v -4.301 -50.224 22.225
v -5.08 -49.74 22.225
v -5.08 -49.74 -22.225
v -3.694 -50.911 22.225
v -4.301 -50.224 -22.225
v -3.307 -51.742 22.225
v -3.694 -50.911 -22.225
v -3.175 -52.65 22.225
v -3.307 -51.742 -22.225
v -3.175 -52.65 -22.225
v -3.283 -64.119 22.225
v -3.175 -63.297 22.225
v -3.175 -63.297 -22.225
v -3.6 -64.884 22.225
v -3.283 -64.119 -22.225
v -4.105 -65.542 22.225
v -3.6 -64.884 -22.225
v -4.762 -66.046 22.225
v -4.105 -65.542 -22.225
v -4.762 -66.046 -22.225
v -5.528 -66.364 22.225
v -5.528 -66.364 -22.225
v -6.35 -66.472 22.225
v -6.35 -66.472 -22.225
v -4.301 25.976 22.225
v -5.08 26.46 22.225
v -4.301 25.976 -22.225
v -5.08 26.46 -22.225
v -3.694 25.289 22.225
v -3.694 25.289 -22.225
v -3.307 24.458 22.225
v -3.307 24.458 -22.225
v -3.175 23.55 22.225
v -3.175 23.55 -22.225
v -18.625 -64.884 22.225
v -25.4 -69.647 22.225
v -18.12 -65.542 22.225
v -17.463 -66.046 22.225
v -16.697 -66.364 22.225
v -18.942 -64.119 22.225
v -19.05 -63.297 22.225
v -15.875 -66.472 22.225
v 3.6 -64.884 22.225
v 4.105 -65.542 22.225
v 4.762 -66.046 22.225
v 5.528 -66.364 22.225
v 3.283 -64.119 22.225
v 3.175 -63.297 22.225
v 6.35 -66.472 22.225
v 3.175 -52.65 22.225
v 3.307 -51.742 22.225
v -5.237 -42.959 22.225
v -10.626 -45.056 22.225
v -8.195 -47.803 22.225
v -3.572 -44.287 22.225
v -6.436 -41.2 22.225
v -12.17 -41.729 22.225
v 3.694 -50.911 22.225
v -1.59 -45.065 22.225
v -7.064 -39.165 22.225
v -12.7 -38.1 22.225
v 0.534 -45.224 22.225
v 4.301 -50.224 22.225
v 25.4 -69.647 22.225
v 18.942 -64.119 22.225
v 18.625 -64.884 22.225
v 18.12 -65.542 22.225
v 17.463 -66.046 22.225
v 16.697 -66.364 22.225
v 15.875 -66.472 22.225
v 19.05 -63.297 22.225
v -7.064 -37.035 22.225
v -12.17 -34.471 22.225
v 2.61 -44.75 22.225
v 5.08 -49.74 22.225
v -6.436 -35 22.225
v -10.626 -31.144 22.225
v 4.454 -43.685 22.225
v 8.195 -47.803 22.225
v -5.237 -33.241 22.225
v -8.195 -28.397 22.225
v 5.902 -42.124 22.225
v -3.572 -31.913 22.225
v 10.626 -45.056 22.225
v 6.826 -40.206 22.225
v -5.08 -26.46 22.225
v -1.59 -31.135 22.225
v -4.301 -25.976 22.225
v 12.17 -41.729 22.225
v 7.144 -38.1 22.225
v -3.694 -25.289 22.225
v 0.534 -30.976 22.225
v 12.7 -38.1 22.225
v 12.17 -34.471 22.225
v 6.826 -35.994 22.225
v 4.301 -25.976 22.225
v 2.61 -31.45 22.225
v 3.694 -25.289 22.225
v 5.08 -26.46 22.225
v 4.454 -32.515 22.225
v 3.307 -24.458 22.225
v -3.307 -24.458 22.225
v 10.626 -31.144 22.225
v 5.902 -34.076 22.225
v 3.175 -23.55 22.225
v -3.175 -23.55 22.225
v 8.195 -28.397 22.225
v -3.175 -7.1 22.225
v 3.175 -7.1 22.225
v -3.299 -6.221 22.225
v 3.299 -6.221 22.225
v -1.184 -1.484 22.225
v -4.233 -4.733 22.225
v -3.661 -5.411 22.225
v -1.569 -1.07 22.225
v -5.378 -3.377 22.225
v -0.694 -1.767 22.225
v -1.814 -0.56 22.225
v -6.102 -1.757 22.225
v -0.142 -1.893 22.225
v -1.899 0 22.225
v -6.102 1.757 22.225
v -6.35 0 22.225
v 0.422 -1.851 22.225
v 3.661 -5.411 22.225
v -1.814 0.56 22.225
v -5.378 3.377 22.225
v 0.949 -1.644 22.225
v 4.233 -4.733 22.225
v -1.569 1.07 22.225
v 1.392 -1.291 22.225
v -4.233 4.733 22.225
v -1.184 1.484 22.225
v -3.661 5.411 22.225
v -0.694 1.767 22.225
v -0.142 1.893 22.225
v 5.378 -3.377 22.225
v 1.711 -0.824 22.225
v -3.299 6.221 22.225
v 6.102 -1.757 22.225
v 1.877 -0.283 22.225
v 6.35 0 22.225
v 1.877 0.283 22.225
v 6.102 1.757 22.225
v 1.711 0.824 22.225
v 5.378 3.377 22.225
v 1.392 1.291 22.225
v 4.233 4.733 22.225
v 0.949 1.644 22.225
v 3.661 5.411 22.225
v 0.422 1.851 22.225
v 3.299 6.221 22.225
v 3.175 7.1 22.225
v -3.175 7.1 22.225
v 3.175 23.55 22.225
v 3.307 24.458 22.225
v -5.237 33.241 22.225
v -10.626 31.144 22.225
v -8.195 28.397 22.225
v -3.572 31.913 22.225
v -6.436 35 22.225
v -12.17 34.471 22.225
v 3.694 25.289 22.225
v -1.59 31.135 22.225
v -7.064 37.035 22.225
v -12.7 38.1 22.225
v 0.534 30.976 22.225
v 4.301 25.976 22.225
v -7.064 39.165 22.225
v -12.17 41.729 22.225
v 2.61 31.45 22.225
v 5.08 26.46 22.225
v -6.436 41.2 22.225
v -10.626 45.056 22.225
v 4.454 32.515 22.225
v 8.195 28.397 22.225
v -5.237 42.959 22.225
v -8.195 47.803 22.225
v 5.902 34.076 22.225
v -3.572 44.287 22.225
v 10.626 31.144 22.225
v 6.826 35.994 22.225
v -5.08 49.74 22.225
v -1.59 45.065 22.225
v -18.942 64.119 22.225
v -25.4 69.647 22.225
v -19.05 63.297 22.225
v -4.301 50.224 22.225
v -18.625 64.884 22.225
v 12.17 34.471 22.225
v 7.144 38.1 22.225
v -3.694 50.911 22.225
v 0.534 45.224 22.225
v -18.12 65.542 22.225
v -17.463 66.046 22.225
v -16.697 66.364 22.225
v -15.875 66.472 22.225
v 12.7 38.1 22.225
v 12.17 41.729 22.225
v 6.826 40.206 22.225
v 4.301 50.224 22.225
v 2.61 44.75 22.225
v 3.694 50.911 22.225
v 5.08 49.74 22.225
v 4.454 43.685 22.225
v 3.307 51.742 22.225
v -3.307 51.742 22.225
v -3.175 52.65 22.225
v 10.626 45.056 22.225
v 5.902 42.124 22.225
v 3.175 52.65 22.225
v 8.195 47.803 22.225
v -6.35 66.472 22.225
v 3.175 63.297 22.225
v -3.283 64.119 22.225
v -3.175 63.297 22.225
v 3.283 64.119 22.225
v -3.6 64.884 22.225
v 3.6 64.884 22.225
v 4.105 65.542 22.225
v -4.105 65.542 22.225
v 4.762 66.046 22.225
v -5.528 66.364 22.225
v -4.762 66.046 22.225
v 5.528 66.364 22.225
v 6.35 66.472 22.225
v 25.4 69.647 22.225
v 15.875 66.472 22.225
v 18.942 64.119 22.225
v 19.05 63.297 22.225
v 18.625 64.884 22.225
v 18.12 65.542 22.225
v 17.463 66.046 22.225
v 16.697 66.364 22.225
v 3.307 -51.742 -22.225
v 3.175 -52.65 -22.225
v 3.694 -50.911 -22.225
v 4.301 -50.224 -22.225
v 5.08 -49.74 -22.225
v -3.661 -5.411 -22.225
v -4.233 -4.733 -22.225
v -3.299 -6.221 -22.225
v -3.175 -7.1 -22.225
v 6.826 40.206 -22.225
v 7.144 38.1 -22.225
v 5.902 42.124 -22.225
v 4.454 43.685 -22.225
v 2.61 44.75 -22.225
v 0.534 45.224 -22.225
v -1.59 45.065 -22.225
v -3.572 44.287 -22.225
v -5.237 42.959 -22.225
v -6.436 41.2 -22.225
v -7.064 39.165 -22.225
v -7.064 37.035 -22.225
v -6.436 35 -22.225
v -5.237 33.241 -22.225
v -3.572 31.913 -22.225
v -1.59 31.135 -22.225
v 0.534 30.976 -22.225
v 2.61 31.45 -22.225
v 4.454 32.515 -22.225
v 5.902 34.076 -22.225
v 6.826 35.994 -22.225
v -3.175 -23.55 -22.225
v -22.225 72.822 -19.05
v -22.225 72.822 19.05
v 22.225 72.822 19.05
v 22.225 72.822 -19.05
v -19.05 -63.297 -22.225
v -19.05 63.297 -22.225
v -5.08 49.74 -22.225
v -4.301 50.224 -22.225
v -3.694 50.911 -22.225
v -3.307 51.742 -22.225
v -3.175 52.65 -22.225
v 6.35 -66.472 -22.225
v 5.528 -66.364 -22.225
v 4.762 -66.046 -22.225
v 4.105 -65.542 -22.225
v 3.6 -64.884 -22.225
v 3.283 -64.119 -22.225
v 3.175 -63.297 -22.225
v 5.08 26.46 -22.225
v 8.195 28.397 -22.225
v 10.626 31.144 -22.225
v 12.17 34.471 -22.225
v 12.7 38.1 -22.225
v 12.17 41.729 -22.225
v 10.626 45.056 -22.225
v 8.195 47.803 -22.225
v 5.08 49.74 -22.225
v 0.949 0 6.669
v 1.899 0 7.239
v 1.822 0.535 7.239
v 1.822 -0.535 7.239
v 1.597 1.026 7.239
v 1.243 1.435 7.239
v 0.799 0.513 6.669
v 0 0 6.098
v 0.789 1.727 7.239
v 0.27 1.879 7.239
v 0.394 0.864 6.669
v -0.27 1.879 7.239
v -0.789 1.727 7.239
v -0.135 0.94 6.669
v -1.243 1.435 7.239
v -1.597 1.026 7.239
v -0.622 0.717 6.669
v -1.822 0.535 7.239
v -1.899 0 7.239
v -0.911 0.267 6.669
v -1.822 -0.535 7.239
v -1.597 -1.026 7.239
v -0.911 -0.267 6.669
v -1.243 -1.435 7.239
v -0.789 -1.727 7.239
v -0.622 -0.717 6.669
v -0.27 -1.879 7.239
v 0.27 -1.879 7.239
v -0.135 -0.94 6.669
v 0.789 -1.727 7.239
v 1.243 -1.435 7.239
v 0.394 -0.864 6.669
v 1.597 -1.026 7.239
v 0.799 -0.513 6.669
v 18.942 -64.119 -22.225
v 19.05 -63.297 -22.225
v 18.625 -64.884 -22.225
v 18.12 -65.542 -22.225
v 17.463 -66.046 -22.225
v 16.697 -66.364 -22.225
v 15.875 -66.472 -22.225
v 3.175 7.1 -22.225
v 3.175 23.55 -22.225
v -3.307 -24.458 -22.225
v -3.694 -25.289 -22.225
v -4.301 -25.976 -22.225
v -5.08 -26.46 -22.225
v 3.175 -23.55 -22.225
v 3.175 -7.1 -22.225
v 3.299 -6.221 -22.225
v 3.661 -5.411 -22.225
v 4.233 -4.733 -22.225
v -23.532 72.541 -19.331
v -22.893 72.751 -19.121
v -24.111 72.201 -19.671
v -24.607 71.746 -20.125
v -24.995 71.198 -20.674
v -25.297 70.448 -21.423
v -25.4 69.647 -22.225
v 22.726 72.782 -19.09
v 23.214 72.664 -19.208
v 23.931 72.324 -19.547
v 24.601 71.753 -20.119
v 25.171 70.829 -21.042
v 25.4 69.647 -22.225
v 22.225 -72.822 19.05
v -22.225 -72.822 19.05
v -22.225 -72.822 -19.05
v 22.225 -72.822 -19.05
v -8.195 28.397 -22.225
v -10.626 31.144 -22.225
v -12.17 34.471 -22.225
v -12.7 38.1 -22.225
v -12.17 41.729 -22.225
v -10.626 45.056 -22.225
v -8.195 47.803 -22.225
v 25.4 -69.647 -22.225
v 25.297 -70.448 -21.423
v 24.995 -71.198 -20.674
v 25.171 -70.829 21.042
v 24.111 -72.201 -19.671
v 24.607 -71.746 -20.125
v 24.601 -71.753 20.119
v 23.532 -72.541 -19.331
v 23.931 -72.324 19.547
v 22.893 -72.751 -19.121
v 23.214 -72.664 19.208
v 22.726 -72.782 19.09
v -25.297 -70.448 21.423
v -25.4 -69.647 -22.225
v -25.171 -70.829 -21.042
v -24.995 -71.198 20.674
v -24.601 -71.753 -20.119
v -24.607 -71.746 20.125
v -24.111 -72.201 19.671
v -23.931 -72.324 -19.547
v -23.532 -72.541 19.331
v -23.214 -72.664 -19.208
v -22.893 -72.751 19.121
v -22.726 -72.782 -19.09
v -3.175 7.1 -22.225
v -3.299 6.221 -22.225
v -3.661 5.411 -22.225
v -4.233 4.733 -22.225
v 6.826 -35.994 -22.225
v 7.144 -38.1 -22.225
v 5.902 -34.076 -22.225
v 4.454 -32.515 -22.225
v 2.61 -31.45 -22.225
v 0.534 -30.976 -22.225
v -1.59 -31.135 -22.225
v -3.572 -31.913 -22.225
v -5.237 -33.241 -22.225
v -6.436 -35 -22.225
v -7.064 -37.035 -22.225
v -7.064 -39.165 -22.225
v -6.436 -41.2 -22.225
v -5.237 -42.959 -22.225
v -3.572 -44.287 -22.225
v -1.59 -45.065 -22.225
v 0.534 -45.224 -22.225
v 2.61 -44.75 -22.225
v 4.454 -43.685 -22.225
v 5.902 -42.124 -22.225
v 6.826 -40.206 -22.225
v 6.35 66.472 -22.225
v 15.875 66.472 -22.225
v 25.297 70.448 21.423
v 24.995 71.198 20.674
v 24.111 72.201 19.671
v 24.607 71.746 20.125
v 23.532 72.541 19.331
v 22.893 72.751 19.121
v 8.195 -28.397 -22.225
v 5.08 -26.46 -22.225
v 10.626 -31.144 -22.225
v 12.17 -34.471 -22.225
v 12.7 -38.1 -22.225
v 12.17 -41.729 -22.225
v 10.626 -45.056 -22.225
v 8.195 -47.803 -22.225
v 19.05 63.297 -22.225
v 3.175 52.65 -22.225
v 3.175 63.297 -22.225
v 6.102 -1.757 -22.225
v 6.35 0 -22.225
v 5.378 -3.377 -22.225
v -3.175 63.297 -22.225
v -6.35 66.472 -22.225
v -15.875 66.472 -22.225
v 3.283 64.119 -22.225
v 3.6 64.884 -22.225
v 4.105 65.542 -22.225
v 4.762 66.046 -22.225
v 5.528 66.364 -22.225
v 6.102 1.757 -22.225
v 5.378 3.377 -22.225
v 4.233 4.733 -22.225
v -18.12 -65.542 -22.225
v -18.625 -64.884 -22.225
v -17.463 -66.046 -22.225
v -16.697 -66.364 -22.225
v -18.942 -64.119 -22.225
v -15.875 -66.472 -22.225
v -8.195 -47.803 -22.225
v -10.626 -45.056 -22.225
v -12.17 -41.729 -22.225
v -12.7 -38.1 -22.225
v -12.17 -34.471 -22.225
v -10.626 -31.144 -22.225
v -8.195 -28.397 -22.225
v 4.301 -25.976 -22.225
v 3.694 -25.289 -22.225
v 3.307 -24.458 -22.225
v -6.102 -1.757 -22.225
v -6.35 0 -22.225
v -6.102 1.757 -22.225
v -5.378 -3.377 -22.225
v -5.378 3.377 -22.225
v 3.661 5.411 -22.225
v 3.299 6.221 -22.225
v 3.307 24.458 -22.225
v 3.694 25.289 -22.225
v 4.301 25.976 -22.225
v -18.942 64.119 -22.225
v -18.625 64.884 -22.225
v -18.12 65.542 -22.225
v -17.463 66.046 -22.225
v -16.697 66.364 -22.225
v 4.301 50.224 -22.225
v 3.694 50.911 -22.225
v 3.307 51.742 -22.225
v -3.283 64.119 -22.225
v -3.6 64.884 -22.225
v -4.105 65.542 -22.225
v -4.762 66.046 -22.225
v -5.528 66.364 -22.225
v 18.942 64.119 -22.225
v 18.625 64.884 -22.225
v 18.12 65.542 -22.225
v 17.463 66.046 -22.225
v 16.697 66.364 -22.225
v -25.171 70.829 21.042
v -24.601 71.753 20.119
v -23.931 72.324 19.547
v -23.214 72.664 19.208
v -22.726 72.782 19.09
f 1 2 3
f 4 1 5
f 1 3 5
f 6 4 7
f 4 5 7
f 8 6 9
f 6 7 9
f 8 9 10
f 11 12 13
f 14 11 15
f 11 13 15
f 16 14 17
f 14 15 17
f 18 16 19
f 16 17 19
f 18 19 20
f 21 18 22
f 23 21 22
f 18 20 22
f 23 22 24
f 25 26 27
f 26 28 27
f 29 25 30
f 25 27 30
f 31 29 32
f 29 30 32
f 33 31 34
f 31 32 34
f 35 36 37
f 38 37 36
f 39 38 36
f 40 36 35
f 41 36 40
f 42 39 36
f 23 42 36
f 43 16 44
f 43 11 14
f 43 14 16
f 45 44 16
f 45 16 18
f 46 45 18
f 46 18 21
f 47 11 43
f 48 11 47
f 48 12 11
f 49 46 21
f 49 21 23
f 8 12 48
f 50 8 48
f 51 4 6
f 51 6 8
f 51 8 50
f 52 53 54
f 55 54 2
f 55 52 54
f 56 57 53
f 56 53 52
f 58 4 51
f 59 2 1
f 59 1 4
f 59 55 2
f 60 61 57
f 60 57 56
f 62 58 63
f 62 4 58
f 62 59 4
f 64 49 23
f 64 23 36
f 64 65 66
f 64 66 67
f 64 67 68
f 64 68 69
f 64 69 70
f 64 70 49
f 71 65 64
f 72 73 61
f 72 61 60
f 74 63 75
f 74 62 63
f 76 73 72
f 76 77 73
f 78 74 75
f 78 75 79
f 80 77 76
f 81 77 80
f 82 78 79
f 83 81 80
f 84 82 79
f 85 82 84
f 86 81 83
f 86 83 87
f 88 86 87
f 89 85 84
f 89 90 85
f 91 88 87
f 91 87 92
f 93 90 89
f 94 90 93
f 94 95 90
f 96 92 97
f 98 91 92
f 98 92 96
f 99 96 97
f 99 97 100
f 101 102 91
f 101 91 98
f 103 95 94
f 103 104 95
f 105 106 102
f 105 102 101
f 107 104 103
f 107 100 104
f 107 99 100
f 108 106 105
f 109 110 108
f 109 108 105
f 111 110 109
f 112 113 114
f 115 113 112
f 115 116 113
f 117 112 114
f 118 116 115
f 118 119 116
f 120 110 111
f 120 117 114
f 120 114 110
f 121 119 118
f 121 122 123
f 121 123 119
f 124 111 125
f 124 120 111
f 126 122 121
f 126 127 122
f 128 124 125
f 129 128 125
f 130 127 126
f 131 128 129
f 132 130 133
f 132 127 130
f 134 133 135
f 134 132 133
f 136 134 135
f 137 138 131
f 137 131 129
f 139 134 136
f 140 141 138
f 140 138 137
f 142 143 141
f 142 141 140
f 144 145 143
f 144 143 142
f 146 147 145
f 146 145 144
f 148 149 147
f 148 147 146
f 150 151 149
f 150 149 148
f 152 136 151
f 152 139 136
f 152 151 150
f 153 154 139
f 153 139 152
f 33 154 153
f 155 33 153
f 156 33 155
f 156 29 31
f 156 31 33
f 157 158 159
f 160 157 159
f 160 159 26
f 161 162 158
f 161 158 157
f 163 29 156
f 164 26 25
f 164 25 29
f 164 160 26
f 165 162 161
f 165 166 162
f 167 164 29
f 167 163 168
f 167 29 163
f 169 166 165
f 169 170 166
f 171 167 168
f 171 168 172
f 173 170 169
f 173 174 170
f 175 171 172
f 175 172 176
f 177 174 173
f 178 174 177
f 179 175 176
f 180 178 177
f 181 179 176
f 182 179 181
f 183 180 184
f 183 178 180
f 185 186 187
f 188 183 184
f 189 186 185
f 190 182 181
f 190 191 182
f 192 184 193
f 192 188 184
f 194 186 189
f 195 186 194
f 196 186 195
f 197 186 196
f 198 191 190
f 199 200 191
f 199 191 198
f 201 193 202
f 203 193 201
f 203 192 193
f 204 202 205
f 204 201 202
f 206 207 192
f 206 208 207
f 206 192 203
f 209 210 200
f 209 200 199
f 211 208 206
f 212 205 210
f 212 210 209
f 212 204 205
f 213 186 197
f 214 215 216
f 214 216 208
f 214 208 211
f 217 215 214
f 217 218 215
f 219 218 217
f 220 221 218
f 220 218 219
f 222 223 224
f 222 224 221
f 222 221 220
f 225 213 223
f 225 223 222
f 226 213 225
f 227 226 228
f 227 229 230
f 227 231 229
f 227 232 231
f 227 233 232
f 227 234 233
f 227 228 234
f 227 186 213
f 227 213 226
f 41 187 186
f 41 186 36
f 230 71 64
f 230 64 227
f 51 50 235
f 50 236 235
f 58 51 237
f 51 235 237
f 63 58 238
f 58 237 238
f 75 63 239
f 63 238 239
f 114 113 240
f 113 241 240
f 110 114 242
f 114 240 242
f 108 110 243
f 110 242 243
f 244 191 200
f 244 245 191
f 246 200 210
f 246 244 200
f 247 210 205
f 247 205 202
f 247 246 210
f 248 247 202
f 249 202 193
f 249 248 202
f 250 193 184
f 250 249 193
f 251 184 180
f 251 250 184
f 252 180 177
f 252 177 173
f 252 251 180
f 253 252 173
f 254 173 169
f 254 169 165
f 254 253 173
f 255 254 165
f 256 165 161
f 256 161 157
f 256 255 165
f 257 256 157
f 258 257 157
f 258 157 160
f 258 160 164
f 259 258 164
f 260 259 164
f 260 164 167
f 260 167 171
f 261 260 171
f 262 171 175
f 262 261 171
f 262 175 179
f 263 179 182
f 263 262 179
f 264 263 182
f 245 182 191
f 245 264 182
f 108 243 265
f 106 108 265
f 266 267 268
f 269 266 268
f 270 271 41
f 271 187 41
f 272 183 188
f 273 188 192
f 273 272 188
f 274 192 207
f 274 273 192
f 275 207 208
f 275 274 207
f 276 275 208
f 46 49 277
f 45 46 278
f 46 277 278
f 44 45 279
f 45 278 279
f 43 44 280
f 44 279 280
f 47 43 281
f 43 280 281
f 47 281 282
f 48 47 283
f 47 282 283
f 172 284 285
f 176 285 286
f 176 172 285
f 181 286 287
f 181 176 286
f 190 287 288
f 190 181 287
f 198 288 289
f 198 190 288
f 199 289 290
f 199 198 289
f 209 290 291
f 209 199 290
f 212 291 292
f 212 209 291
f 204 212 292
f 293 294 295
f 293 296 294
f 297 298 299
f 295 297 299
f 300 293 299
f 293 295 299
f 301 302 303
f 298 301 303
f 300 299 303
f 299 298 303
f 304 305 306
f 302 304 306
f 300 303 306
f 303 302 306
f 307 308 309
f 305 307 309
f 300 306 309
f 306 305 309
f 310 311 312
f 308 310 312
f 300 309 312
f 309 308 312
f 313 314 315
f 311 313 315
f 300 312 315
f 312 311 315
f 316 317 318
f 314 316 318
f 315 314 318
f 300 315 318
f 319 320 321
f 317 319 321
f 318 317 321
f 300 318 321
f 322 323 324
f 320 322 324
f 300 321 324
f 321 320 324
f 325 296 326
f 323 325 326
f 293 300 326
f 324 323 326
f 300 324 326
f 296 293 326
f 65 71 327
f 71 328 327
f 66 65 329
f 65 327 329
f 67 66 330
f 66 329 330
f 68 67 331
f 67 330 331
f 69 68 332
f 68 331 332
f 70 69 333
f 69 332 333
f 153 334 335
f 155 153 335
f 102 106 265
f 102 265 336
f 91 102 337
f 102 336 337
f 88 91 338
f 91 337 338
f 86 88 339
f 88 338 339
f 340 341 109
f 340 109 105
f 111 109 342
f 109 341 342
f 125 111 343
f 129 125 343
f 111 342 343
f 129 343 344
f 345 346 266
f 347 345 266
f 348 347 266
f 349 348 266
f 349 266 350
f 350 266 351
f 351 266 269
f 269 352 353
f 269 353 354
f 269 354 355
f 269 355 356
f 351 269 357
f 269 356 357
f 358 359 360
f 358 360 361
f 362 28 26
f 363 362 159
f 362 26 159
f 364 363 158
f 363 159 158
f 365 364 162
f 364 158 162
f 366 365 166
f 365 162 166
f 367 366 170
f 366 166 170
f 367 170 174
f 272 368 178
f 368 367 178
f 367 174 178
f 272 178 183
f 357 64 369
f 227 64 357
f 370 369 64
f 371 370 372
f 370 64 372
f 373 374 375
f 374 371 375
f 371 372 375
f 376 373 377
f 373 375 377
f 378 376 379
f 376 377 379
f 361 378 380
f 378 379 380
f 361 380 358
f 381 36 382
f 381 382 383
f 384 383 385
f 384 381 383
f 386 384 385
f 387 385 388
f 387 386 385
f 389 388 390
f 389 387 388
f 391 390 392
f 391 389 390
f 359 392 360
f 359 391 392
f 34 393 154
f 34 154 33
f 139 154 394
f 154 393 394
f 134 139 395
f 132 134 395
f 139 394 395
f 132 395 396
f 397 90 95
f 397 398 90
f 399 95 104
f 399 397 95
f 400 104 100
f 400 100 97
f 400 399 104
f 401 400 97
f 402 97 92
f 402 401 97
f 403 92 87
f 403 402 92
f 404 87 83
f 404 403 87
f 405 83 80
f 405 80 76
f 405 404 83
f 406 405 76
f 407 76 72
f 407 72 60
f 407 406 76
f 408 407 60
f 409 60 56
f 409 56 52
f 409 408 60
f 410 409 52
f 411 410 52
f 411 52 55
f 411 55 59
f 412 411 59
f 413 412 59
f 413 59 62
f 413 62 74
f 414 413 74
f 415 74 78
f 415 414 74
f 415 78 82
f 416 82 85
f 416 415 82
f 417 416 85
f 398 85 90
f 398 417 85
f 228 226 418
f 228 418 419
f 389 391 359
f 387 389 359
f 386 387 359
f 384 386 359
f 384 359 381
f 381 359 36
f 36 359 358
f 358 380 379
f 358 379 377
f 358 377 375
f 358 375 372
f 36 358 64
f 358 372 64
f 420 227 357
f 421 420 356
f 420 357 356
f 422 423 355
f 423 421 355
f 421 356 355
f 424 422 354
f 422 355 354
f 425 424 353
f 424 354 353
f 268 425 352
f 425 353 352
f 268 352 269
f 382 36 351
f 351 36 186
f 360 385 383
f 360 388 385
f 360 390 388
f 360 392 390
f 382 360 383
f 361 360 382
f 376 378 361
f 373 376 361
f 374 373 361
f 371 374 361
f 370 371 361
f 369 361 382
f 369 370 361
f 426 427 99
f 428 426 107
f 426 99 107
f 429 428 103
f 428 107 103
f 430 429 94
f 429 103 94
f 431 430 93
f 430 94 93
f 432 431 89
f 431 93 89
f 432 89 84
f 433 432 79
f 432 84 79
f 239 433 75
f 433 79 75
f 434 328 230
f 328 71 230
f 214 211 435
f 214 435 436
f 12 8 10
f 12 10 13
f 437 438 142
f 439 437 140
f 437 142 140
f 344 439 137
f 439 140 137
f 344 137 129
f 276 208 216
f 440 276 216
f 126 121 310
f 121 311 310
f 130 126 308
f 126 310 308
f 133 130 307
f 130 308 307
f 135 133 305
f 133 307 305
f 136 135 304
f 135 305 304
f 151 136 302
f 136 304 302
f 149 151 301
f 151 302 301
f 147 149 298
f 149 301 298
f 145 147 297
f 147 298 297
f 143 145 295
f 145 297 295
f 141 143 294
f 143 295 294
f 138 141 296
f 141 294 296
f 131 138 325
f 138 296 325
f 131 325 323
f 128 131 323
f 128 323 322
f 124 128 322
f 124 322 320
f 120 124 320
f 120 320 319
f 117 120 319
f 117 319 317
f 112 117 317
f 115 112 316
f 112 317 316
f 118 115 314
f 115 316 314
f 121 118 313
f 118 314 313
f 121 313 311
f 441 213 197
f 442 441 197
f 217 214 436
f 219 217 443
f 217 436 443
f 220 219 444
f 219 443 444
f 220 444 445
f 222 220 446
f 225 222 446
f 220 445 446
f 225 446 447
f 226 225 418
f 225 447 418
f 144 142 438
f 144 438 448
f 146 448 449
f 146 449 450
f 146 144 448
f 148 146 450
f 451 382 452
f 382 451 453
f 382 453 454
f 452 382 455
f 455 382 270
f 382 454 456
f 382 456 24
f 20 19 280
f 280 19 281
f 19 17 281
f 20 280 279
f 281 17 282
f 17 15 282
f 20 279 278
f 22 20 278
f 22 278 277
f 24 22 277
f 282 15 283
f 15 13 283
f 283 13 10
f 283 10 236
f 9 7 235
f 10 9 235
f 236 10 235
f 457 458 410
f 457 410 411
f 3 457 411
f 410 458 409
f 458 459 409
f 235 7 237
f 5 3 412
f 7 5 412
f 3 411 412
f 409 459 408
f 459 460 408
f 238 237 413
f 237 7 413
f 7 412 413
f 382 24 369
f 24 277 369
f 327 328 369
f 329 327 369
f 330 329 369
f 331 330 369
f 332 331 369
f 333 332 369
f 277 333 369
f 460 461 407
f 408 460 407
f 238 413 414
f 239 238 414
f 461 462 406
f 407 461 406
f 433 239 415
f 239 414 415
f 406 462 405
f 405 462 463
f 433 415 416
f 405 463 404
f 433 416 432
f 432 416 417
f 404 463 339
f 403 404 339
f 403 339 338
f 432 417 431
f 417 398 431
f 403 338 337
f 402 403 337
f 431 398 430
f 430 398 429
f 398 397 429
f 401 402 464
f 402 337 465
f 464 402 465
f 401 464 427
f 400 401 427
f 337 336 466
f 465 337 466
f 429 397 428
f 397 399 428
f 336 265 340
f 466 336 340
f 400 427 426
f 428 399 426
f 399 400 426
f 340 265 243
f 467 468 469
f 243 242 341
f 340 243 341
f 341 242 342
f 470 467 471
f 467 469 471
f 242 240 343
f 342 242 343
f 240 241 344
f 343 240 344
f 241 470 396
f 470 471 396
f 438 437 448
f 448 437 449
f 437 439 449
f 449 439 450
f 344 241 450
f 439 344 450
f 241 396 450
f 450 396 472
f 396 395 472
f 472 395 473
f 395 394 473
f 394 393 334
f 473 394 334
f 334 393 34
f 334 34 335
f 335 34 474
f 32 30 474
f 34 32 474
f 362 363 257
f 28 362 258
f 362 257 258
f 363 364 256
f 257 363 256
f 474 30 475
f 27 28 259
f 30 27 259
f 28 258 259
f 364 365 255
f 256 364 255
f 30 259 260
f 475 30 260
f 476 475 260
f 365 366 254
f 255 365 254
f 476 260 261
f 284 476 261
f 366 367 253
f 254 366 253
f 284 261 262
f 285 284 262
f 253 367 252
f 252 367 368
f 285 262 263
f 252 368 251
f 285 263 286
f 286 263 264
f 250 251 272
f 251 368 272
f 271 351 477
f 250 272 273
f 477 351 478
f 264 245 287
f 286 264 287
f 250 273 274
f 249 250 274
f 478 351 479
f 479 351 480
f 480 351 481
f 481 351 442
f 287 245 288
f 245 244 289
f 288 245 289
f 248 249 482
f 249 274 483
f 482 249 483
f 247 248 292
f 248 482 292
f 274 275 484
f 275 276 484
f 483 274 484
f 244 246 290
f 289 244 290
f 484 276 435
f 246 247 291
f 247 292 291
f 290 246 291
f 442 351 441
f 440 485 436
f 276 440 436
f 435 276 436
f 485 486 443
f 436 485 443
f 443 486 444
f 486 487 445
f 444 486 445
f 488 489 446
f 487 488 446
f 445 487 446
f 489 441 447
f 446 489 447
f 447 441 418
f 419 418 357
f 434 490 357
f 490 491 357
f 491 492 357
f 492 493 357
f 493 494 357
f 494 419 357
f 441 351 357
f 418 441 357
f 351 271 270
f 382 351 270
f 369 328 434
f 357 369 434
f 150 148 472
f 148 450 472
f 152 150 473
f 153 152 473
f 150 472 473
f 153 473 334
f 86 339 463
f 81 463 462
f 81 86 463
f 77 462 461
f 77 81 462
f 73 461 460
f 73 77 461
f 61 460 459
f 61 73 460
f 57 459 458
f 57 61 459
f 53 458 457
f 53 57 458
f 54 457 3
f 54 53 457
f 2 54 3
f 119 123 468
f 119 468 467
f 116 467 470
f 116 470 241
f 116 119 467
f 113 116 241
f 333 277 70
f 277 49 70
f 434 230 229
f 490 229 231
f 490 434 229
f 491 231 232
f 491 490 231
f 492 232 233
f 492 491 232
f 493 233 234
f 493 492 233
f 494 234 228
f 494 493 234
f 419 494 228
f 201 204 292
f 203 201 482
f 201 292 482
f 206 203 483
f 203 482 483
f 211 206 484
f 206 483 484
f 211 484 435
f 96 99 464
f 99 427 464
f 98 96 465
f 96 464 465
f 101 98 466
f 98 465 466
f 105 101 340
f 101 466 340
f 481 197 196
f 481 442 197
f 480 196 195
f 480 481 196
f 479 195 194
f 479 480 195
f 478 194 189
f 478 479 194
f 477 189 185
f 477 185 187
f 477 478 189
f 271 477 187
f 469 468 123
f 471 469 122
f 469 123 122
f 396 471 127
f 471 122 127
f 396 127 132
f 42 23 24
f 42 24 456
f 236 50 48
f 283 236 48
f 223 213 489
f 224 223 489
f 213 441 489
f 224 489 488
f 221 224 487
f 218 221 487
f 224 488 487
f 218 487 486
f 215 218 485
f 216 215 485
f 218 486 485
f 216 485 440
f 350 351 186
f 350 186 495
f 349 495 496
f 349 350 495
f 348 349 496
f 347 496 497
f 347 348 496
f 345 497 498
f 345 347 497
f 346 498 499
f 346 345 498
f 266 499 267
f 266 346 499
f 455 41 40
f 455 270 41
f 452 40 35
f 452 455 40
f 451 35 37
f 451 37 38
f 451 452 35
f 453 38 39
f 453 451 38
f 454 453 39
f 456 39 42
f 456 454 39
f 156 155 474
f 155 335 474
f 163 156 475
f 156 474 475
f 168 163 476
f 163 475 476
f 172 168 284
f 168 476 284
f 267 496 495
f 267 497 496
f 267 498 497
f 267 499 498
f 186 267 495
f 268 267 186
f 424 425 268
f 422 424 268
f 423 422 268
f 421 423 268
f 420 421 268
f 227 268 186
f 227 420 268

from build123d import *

# Parameters (mm, degrees)
SKETCH1_W                  = 50.8
SKETCH1_H                  = 145.6436
SKETCH1_R                  = 7.14375
BOSS_EXTRUDE1_DEPTH        = 22.225
CUT_EXTRUDE2_DEPTH         = 45.45
FILLET1_R                  = 3.175
CUT_EXTRUDE4_DEPTH         = 51.8
MIRROR3_COPY_1_DEPTH       = 45.45
MIRROR3_COPY_2_DEPTH       = 45.45
MIRROR3_COPY_3_DEPTH       = 51.8
F_10_24_TAPPED_HOLE1_D     = 3.7973
F_10_24_TAPPED_HOLE1_DEPTH = 14.986
F_10_24_TAPPED_HOLE1_TIP   = 1.140824014
FILLET2_R                  = 3.175


with BuildPart() as part:
    # Sketch1 → Boss-Extrude1 (new body, symmetric)
    with BuildSketch(Plane.XY):
        Rectangle(SKETCH1_W, SKETCH1_H)
        with Locations((0, 38.1)):
            Circle(SKETCH1_R, mode=Mode.SUBTRACT)
        with Locations((0, -38.1)):
            Circle(SKETCH1_R, mode=Mode.SUBTRACT)
    extrude(amount=BOSS_EXTRUDE1_DEPTH, both=True)

    # Sketch3 → Cut-Extrude2 (cut, through all)
    with BuildSketch(Plane.XY.offset(22.225)):
        with BuildLine():
            Line((19.05, 66.4718), (19.05, 0))
            Line((19.05, 0), (6.35, 0))
            ThreePointArc((6.35, 0), (5.499261314, 3.175), (3.175, 5.499261314))
            Line((3.175, 5.499261314), (3.175, 25.803277876))
            ThreePointArc((3.175, 25.803277876), (12.7, 38.1), (3.175, 50.396722124))
            Line((3.175, 50.396722124), (3.175, 66.4718))
            Line((3.175, 66.4718), (19.05, 66.4718))
        make_face()
    cut_extrude2 = extrude(amount=-CUT_EXTRUDE2_DEPTH, mode=Mode.SUBTRACT)

    # Mirror4: Cut-Extrude2 across plane
    add(cut_extrude2.mirror(Plane(origin=(0, 0, 0), x_dir=(0, 0, 1), z_dir=(1, 0, 0))), mode=Mode.SUBTRACT)

    # Mirror1: Cut-Extrude2 across plane
    add(cut_extrude2.mirror(Plane.ZX), mode=Mode.SUBTRACT)

    # Fillet1
    fillet1_edges = [part.edges().sort_by_distance(p)[0] for p in [
        (3.175, 50.396722124, 0),
        (19.05, 66.4718, 0),
        (-19.05, 66.4718, 0),
        (-3.175, 50.396722124, 0),
        (-25.4, 72.8218, 0),
        (19.05, -66.4718, 0),
        (25.4, 72.8218, 0),
        (25.4, -72.8218, 0),
        (-25.4, -72.8218, 0),
    ]]
    fillet(fillet1_edges, radius=FILLET1_R)

    # Sketch5 → Cut-Extrude4 (cut, through all)
    with BuildSketch(Plane(origin=(25.4, 0, 0), x_dir=(0, 0, -1), z_dir=(1, 0, 0))):
        Polygon((19.05, 72.8218), (22.225, 69.6468), (22.225, 72.8218), align=None)
    cut_extrude4 = extrude(amount=-CUT_EXTRUDE4_DEPTH, mode=Mode.SUBTRACT)

    # Mirror2: Cut-Extrude4 across plane
    add(cut_extrude4.mirror(Plane.XY), mode=Mode.SUBTRACT)

    # Mirror3: Cut-Extrude4 across plane
    add(cut_extrude4.mirror(Plane.ZX), mode=Mode.SUBTRACT)

    # Mirror3 copy 1 sketch → Mirror3 copy 1 (cut, through all)
    with BuildSketch(Plane(origin=(0, 0, 22.225), x_dir=(-1, 0, 0), z_dir=(0, 0, 1))):
        with BuildLine():
            Line((19.05, 66.4718), (19.05, 0))
            Line((19.05, 0), (6.35, 0))
            ThreePointArc((6.35, 0), (5.499261314, 3.175), (3.175, 5.499261314))
            Line((3.175, 5.499261314), (3.175, 25.803277876))
            ThreePointArc((3.175, 25.803277876), (12.7, 38.1), (3.175, 50.396722124))
            Line((3.175, 50.396722124), (3.175, 66.4718))
            Line((3.175, 66.4718), (19.05, 66.4718))
        make_face()
    extrude(amount=-MIRROR3_COPY_1_DEPTH, mode=Mode.SUBTRACT)

    # Mirror3 copy 2 sketch → Mirror3 copy 2 (cut, through all)
    with BuildSketch(Plane.XY.offset(22.225)):
        with BuildLine():
            Line((19.05, -66.4718), (19.05, 0))
            Line((19.05, 0), (6.35, 0))
            ThreePointArc((6.35, 0), (5.499261314, -3.175), (3.175, -5.499261314))
            Line((3.175, -5.499261314), (3.175, -25.803277876))
            ThreePointArc((3.175, -25.803277876), (12.7, -38.1), (3.175, -50.396722124))
            Line((3.175, -50.396722124), (3.175, -66.4718))
            Line((3.175, -66.4718), (19.05, -66.4718))
        make_face()
    extrude(amount=-MIRROR3_COPY_2_DEPTH, mode=Mode.SUBTRACT)

    # Mirror3 copy 3 sketch → Mirror3 copy 3 (cut, through all)
    with BuildSketch(Plane(origin=(25.4, 0, 0), x_dir=(0, 0, 1), z_dir=(1, 0, 0))):
        Polygon((19.05, 72.8218), (22.225, 69.6468), (22.225, 72.8218), align=None)
    extrude(amount=-MIRROR3_COPY_3_DEPTH, mode=Mode.SUBTRACT)

    # #10-24 Tapped Hole1
    with Locations(Plane.XY.offset(22.225)):
        with Locations((0, 0)):
            Hole(F_10_24_TAPPED_HOLE1_D / 2, depth=F_10_24_TAPPED_HOLE1_DEPTH)
            with Locations((0, 0, -(F_10_24_TAPPED_HOLE1_DEPTH + F_10_24_TAPPED_HOLE1_TIP / 2))):  # 118° drill point
                Cone(0, F_10_24_TAPPED_HOLE1_D / 2, F_10_24_TAPPED_HOLE1_TIP, mode=Mode.SUBTRACT)

    # Fillet2
    fillet2_edges = [part.edges().sort_by_distance(p)[0] for p in [
        (-3.175, -5.499261314, 0),
        (-3.175, -25.803277876, 0),
        (-3.175, -50.396722124, 0),
        (-3.175, -66.4718, 0),
        (-19.05, -66.4718, 0),
        (19.05, -66.4718, 0),
        (3.175, 5.499261314, 0),
        (3.175, 25.803277876, 0),
        (3.175, 66.4718, 0),
        (-3.175, 66.4718, 0),
        (-3.175, 25.803277876, 0),
        (-3.175, 5.499261314, 0),
        (3.175, -66.4718, 0),
        (3.175, -50.396722124, 0),
        (3.175, -25.803277876, 0),
        (3.175, -5.499261314, 0),
    ]]
    fillet(fillet2_edges, radius=FILLET2_R)


solid = part.part
